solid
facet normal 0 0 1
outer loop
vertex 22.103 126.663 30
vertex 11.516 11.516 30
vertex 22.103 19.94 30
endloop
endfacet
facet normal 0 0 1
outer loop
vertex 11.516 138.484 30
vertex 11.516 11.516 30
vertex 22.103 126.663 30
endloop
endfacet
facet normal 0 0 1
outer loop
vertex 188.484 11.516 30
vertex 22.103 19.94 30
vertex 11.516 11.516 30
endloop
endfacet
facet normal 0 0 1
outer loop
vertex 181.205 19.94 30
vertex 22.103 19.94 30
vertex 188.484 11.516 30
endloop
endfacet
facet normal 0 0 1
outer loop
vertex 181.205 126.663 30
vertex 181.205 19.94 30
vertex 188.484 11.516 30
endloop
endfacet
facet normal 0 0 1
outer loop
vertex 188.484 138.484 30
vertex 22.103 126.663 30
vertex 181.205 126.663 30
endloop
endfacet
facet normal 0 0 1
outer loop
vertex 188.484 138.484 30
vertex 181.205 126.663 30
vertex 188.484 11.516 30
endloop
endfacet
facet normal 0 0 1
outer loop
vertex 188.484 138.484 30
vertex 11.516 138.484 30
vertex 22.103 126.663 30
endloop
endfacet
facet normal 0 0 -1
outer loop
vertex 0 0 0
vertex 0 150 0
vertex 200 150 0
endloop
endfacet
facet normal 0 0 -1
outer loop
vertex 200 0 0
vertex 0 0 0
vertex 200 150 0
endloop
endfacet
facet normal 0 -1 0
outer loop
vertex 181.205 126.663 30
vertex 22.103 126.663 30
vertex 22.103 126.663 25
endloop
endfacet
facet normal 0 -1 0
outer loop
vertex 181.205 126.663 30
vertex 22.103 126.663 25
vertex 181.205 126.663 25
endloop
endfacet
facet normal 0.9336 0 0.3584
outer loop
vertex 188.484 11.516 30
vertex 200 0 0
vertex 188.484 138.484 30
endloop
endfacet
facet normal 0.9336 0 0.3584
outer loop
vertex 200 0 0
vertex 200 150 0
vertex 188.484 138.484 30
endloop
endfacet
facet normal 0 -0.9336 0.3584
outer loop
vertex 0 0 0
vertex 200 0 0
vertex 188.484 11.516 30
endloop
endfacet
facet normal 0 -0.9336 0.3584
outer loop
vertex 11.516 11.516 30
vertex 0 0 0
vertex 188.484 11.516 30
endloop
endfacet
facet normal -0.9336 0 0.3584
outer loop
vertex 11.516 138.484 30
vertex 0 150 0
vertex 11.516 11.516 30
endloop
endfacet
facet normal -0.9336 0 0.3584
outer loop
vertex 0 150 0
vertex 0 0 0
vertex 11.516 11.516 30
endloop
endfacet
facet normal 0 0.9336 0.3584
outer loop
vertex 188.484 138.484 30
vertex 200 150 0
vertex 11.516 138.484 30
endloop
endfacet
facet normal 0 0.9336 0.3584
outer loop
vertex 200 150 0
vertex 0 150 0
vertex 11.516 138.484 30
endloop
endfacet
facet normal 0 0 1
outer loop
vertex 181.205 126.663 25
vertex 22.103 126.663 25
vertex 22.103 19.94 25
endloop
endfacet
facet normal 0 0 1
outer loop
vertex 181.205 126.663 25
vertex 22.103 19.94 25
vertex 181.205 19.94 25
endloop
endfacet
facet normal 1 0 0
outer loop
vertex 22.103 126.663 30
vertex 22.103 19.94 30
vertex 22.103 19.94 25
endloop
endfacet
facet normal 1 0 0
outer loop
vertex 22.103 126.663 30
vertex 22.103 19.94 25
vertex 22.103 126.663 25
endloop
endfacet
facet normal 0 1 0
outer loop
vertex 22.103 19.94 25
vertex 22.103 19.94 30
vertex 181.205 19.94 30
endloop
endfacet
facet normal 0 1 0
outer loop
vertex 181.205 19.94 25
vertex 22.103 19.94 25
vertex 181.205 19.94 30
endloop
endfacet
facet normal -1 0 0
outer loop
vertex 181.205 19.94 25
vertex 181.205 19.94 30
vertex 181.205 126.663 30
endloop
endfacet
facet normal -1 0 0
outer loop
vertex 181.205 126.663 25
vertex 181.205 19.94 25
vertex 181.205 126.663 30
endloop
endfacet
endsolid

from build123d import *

# Parameters (mm, degrees)
IZIM1_W                     = 200
IZIM1_H                     = 150
Y_KSEKLIK_EKSTR_ZYON1_DEPTH = 30
Y_KSEKLIK_EKSTR_ZYON1_TAPER = 21
IZIM2_W                     = 159.102427113
IZIM2_H                     = 106.722832774
KES_EKSTR_ZYON1_DEPTH       = 5


with BuildPart() as part:
    # Çizim1 → Yükseklik-Ekstrüzyon1 (new body)
    with BuildSketch(Plane.XY):
        with Locations((100, 75)):
            Rectangle(IZIM1_W, IZIM1_H)
    extrude(amount=Y_KSEKLIK_EKSTR_ZYON1_DEPTH, taper=Y_KSEKLIK_EKSTR_ZYON1_TAPER)

    # Çizim2 → Kes-Ekstrüzyon1 (cut)
    with BuildSketch(Plane.XY.offset(30)):
        with Locations((101.653948212, 73.301492912)):
            Rectangle(IZIM2_W, IZIM2_H)
    extrude(amount=-KES_EKSTR_ZYON1_DEPTH, mode=Mode.SUBTRACT)


solid = part.part
